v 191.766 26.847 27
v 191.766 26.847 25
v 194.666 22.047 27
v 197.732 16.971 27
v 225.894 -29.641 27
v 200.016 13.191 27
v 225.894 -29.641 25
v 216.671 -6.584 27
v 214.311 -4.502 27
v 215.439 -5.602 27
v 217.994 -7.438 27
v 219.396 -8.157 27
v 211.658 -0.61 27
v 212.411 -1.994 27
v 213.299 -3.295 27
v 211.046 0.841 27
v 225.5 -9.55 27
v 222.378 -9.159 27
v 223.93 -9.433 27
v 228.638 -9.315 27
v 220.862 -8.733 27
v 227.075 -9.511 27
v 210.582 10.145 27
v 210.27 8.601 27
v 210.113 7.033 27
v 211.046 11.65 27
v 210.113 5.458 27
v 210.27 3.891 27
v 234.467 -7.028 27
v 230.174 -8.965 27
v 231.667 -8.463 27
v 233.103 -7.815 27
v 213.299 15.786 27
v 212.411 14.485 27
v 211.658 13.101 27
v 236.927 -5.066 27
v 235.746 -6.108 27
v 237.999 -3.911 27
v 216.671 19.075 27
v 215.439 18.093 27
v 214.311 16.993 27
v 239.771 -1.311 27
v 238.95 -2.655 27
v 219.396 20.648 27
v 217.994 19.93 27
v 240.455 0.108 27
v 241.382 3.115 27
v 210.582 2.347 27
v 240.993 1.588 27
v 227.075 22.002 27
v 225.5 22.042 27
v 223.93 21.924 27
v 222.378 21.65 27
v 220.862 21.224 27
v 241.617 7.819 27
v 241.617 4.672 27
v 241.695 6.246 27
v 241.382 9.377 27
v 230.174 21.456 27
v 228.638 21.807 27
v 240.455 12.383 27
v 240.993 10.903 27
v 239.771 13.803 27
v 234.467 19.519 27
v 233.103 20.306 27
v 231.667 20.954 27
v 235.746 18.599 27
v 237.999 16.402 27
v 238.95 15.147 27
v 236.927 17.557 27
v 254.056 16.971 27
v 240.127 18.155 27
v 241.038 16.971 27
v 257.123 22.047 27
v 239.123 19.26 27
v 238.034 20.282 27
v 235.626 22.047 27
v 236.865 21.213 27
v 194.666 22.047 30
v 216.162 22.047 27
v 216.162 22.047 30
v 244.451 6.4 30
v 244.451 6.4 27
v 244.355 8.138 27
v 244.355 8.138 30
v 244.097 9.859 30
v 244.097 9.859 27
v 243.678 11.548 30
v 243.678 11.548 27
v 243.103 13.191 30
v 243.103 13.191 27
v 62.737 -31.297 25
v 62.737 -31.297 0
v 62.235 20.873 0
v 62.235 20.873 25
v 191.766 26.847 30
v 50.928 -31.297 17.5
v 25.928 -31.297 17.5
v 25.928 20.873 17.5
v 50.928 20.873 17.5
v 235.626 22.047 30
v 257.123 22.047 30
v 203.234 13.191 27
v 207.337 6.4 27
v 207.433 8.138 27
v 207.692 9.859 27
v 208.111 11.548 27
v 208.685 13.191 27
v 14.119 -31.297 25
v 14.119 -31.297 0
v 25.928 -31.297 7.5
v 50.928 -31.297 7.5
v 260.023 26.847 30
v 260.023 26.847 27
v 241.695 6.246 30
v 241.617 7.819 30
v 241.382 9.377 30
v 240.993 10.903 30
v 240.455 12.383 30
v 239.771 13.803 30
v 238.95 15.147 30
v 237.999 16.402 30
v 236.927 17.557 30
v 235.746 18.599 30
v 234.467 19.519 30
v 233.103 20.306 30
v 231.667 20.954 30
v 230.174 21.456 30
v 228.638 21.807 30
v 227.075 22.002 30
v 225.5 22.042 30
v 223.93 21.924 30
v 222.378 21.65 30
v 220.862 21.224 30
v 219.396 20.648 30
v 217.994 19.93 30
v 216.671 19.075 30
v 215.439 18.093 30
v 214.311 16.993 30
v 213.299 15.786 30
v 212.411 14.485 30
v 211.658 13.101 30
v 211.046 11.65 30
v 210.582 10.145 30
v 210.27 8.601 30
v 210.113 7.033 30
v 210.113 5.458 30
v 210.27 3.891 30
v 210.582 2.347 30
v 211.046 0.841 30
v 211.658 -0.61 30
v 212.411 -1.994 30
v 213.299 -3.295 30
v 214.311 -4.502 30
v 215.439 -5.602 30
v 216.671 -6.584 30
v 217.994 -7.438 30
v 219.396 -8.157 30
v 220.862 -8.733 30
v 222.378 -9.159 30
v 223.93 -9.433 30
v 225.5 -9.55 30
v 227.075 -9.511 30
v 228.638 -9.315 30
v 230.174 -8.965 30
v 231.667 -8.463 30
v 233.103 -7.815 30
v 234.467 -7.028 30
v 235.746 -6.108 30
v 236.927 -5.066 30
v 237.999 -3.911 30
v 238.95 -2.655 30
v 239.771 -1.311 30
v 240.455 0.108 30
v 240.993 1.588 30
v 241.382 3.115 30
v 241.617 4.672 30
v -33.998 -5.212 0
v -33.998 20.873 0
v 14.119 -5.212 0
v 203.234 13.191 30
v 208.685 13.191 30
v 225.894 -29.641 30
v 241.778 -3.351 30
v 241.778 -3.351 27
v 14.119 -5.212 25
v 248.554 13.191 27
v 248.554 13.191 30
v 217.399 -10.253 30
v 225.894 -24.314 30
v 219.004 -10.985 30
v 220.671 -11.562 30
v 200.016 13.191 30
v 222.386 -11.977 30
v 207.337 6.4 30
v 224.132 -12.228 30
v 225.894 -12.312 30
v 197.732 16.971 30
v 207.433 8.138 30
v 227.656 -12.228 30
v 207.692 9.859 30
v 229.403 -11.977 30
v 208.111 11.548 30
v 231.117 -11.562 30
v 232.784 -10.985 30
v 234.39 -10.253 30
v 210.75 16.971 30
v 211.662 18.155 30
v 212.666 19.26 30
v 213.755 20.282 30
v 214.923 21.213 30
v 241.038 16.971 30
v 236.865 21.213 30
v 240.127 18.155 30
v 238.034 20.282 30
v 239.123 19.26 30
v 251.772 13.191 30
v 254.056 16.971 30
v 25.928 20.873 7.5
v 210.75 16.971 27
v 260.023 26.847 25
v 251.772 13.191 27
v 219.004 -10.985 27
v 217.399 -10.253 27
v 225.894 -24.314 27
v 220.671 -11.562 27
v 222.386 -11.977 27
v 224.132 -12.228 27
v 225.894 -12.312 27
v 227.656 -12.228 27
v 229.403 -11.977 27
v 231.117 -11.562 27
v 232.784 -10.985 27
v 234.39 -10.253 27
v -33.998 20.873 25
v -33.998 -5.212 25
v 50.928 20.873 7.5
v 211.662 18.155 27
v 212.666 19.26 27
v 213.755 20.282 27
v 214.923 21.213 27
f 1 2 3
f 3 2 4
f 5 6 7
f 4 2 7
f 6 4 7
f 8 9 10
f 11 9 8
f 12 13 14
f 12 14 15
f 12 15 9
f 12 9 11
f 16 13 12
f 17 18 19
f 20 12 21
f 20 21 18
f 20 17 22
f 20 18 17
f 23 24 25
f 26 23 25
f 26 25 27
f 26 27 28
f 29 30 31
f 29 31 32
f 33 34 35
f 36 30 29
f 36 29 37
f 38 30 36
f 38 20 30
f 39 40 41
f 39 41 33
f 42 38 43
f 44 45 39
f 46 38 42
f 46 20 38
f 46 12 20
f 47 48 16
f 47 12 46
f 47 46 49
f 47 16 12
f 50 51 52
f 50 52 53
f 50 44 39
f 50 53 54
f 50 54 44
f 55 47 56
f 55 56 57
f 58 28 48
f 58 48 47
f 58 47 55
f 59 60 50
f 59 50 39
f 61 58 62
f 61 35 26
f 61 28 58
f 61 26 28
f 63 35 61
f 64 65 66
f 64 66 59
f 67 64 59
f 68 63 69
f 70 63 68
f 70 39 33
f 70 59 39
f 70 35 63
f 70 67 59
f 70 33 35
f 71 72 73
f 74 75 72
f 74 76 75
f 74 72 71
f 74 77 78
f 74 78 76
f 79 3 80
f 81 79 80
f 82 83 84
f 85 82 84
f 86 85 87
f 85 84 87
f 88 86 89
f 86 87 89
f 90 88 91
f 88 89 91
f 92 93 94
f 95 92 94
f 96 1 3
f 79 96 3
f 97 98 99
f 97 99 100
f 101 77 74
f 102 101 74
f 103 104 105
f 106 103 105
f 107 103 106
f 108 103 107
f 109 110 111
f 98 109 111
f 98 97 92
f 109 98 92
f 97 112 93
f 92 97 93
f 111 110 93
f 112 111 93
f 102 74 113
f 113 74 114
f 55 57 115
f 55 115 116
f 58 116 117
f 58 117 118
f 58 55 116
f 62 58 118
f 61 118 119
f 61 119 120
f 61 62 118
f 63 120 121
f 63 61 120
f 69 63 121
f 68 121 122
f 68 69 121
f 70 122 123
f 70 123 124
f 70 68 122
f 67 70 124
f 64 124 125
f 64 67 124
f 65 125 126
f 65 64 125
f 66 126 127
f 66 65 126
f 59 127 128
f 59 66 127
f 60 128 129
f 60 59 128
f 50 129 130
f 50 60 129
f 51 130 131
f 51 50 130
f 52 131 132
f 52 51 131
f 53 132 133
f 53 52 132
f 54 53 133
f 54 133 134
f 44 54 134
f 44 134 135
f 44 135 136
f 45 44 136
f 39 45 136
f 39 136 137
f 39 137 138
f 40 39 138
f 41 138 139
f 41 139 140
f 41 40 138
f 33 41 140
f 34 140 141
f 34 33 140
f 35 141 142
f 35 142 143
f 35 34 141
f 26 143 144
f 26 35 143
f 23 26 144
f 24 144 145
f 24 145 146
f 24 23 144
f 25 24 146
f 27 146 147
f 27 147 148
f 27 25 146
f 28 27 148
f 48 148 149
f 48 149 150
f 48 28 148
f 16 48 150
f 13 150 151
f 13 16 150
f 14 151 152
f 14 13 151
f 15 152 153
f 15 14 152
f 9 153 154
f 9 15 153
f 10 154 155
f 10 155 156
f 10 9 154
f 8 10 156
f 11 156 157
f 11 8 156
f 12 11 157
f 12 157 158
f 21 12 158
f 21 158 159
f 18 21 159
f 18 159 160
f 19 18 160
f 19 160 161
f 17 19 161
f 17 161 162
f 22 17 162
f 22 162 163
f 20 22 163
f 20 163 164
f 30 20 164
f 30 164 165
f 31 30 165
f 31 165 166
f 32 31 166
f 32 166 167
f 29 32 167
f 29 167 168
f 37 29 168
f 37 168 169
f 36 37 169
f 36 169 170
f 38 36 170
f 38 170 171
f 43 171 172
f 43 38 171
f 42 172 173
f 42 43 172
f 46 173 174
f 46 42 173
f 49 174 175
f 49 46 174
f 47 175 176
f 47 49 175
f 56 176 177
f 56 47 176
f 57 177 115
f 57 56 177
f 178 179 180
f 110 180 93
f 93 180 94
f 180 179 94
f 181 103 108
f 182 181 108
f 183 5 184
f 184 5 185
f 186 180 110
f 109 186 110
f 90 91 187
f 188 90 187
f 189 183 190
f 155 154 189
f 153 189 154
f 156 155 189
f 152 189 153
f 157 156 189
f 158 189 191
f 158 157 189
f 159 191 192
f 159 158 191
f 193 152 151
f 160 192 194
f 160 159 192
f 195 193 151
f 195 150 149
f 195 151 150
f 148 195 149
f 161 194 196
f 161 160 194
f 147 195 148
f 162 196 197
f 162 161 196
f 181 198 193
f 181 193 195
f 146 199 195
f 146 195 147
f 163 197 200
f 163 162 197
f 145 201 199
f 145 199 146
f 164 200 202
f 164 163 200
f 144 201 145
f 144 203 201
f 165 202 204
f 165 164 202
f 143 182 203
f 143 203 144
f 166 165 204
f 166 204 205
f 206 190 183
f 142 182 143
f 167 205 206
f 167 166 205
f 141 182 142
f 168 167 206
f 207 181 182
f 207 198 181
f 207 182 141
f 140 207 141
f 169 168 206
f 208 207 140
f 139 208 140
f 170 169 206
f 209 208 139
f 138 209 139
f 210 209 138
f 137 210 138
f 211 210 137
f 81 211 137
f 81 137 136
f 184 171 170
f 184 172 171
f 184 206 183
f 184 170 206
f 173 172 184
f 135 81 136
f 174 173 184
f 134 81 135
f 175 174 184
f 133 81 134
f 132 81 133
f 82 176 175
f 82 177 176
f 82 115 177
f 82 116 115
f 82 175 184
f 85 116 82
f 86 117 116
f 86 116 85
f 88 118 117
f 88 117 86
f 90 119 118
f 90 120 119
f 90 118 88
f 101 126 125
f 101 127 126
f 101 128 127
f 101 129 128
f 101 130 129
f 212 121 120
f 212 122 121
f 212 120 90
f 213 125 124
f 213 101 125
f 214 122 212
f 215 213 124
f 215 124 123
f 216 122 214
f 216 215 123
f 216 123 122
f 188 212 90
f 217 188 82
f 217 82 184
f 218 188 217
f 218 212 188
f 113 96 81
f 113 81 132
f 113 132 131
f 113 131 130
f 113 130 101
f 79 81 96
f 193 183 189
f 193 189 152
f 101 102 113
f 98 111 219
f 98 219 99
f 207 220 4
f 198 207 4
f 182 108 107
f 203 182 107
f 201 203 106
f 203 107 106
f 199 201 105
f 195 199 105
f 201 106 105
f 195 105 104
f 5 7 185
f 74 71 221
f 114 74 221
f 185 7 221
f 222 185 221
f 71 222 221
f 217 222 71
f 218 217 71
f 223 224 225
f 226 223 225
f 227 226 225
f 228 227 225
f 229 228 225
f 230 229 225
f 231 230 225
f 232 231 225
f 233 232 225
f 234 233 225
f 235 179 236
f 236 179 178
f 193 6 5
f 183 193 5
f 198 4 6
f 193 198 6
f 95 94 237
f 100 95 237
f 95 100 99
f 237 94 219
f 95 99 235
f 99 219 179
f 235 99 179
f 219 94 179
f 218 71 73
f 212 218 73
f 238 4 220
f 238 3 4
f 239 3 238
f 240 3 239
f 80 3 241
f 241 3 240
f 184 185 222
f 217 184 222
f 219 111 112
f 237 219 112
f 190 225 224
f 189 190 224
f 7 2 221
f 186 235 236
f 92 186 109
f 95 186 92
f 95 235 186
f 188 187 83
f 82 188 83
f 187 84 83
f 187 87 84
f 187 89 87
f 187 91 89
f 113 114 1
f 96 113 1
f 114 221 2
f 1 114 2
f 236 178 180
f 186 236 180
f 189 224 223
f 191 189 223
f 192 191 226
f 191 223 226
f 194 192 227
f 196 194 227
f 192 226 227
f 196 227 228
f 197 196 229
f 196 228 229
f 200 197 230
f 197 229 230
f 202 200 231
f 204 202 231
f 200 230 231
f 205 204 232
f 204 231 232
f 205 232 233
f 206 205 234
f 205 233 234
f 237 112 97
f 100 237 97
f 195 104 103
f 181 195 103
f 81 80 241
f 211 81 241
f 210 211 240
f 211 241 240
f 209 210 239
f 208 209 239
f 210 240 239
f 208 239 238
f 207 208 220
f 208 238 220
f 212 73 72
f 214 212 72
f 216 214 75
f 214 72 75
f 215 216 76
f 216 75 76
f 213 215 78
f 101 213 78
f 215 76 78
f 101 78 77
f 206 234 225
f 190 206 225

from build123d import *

# Parameters (mm, degrees)
F1_DEPTH = 25
F2_W     = 25
F2_H     = 10
F3_DEPTH = 52.170427
F5_DEPTH = 2
F6_R     = 15.801011
F7_DEPTH = 3


with BuildPart() as f1:
    # F0 (on Top) → F1 (new body)
    with BuildSketch(Plane.XY):
        Polygon((62.235128, 20.872559), (-33.998102, 20.872559), (-33.998102, -5.212154), (14.118513, -5.212154), (14.118513, -31.296868), (62.737178, -31.296868), align=None)
    extrude(amount=F1_DEPTH)

    # F2 (on face) → F3 (cut, through all)
    with BuildSketch(Plane.XZ.offset(31.296868)):
        with Locations((38.427846, 12.5)):
            Rectangle(F2_W, F2_H)
    extrude(amount=-F3_DEPTH, mode=Mode.SUBTRACT)


with BuildPart() as f5:
    # F4 (on face) → F5 (new body)
    with BuildSketch(Plane.XY.offset(25)):
        Polygon((191.765636, 26.84707), (225.894317, -29.640514), (260.022998, 26.84707), (225.894317, 26.84707), align=None)
    extrude(amount=F5_DEPTH)

    # F6 (on face) → F7 (join)
    with BuildSketch(Plane.XY.offset(27)):
        with BuildLine():
            Line((260.022998, 26.84707), (191.765636, 26.84707))
            Line((191.765636, 26.84707), (194.665964, 22.046635))
            Line((194.665964, 22.046635), (216.1623, 22.046635))
            ThreePointArc((216.1623, 22.046635), (213.200082, 19.78226), (210.750307, 16.971437))
            Line((210.750307, 16.971437), (197.732298, 16.971437))
            Line((197.732298, 16.971437), (200.016264, 13.191165))
            Line((200.016264, 13.191165), (225.894317, -29.640514))
            Line((225.894317, -29.640514), (241.77795, -3.350952))
            ThreePointArc((241.77795, -3.350952), (243.791512, 1.339047), (244.451262, 6.400198))
            ThreePointArc((244.451262, 6.400198), (244.096702, 9.859108), (243.103139, 13.191165))
            Line((243.103139, 13.191165), (248.55423, 13.191165))
            Line((248.55423, 13.191165), (251.77237, 13.191165))
            Line((251.77237, 13.191165), (254.056336, 16.971437))
            Line((254.056336, 16.971437), (241.038327, 16.971437))
            ThreePointArc((241.038327, 16.971437), (238.588552, 19.78226), (235.626334, 22.046635))
            Line((235.626334, 22.046635), (257.12267, 22.046635))
            Line((257.12267, 22.046635), (260.022998, 26.84707))
        make_face()
        with BuildLine():
            ThreePointArc((217.399103, -10.253328), (225.894317, -12.311964), (234.389531, -10.253328))
            Line((234.389531, -10.253328), (225.894317, -24.314057))
            Line((225.894317, -24.314057), (217.399103, -10.253328))
        make_face(mode=Mode.SUBTRACT)
        with BuildLine():
            Line((207.337372, 6.400198), (203.234404, 13.191165))
            Line((203.234404, 13.191165), (208.685495, 13.191165))
            ThreePointArc((208.685495, 13.191165), (207.691932, 9.859108), (207.337372, 6.400198))
        make_face(mode=Mode.SUBTRACT)
        with Locations((225.894317, 6.245625)):
            Circle(F6_R, mode=Mode.SUBTRACT)
        with BuildLine():
            Line((241.77795, -3.350952), (251.77237, 13.191165))
            Line((251.77237, 13.191165), (248.55423, 13.191165))
            Line((248.55423, 13.191165), (244.451262, 6.400198))
            ThreePointArc((244.451262, 6.400198), (243.791512, 1.339047), (241.77795, -3.350952))
        make_face()
    extrude(amount=F7_DEPTH)


solid = Compound([f1.part, f5.part])
